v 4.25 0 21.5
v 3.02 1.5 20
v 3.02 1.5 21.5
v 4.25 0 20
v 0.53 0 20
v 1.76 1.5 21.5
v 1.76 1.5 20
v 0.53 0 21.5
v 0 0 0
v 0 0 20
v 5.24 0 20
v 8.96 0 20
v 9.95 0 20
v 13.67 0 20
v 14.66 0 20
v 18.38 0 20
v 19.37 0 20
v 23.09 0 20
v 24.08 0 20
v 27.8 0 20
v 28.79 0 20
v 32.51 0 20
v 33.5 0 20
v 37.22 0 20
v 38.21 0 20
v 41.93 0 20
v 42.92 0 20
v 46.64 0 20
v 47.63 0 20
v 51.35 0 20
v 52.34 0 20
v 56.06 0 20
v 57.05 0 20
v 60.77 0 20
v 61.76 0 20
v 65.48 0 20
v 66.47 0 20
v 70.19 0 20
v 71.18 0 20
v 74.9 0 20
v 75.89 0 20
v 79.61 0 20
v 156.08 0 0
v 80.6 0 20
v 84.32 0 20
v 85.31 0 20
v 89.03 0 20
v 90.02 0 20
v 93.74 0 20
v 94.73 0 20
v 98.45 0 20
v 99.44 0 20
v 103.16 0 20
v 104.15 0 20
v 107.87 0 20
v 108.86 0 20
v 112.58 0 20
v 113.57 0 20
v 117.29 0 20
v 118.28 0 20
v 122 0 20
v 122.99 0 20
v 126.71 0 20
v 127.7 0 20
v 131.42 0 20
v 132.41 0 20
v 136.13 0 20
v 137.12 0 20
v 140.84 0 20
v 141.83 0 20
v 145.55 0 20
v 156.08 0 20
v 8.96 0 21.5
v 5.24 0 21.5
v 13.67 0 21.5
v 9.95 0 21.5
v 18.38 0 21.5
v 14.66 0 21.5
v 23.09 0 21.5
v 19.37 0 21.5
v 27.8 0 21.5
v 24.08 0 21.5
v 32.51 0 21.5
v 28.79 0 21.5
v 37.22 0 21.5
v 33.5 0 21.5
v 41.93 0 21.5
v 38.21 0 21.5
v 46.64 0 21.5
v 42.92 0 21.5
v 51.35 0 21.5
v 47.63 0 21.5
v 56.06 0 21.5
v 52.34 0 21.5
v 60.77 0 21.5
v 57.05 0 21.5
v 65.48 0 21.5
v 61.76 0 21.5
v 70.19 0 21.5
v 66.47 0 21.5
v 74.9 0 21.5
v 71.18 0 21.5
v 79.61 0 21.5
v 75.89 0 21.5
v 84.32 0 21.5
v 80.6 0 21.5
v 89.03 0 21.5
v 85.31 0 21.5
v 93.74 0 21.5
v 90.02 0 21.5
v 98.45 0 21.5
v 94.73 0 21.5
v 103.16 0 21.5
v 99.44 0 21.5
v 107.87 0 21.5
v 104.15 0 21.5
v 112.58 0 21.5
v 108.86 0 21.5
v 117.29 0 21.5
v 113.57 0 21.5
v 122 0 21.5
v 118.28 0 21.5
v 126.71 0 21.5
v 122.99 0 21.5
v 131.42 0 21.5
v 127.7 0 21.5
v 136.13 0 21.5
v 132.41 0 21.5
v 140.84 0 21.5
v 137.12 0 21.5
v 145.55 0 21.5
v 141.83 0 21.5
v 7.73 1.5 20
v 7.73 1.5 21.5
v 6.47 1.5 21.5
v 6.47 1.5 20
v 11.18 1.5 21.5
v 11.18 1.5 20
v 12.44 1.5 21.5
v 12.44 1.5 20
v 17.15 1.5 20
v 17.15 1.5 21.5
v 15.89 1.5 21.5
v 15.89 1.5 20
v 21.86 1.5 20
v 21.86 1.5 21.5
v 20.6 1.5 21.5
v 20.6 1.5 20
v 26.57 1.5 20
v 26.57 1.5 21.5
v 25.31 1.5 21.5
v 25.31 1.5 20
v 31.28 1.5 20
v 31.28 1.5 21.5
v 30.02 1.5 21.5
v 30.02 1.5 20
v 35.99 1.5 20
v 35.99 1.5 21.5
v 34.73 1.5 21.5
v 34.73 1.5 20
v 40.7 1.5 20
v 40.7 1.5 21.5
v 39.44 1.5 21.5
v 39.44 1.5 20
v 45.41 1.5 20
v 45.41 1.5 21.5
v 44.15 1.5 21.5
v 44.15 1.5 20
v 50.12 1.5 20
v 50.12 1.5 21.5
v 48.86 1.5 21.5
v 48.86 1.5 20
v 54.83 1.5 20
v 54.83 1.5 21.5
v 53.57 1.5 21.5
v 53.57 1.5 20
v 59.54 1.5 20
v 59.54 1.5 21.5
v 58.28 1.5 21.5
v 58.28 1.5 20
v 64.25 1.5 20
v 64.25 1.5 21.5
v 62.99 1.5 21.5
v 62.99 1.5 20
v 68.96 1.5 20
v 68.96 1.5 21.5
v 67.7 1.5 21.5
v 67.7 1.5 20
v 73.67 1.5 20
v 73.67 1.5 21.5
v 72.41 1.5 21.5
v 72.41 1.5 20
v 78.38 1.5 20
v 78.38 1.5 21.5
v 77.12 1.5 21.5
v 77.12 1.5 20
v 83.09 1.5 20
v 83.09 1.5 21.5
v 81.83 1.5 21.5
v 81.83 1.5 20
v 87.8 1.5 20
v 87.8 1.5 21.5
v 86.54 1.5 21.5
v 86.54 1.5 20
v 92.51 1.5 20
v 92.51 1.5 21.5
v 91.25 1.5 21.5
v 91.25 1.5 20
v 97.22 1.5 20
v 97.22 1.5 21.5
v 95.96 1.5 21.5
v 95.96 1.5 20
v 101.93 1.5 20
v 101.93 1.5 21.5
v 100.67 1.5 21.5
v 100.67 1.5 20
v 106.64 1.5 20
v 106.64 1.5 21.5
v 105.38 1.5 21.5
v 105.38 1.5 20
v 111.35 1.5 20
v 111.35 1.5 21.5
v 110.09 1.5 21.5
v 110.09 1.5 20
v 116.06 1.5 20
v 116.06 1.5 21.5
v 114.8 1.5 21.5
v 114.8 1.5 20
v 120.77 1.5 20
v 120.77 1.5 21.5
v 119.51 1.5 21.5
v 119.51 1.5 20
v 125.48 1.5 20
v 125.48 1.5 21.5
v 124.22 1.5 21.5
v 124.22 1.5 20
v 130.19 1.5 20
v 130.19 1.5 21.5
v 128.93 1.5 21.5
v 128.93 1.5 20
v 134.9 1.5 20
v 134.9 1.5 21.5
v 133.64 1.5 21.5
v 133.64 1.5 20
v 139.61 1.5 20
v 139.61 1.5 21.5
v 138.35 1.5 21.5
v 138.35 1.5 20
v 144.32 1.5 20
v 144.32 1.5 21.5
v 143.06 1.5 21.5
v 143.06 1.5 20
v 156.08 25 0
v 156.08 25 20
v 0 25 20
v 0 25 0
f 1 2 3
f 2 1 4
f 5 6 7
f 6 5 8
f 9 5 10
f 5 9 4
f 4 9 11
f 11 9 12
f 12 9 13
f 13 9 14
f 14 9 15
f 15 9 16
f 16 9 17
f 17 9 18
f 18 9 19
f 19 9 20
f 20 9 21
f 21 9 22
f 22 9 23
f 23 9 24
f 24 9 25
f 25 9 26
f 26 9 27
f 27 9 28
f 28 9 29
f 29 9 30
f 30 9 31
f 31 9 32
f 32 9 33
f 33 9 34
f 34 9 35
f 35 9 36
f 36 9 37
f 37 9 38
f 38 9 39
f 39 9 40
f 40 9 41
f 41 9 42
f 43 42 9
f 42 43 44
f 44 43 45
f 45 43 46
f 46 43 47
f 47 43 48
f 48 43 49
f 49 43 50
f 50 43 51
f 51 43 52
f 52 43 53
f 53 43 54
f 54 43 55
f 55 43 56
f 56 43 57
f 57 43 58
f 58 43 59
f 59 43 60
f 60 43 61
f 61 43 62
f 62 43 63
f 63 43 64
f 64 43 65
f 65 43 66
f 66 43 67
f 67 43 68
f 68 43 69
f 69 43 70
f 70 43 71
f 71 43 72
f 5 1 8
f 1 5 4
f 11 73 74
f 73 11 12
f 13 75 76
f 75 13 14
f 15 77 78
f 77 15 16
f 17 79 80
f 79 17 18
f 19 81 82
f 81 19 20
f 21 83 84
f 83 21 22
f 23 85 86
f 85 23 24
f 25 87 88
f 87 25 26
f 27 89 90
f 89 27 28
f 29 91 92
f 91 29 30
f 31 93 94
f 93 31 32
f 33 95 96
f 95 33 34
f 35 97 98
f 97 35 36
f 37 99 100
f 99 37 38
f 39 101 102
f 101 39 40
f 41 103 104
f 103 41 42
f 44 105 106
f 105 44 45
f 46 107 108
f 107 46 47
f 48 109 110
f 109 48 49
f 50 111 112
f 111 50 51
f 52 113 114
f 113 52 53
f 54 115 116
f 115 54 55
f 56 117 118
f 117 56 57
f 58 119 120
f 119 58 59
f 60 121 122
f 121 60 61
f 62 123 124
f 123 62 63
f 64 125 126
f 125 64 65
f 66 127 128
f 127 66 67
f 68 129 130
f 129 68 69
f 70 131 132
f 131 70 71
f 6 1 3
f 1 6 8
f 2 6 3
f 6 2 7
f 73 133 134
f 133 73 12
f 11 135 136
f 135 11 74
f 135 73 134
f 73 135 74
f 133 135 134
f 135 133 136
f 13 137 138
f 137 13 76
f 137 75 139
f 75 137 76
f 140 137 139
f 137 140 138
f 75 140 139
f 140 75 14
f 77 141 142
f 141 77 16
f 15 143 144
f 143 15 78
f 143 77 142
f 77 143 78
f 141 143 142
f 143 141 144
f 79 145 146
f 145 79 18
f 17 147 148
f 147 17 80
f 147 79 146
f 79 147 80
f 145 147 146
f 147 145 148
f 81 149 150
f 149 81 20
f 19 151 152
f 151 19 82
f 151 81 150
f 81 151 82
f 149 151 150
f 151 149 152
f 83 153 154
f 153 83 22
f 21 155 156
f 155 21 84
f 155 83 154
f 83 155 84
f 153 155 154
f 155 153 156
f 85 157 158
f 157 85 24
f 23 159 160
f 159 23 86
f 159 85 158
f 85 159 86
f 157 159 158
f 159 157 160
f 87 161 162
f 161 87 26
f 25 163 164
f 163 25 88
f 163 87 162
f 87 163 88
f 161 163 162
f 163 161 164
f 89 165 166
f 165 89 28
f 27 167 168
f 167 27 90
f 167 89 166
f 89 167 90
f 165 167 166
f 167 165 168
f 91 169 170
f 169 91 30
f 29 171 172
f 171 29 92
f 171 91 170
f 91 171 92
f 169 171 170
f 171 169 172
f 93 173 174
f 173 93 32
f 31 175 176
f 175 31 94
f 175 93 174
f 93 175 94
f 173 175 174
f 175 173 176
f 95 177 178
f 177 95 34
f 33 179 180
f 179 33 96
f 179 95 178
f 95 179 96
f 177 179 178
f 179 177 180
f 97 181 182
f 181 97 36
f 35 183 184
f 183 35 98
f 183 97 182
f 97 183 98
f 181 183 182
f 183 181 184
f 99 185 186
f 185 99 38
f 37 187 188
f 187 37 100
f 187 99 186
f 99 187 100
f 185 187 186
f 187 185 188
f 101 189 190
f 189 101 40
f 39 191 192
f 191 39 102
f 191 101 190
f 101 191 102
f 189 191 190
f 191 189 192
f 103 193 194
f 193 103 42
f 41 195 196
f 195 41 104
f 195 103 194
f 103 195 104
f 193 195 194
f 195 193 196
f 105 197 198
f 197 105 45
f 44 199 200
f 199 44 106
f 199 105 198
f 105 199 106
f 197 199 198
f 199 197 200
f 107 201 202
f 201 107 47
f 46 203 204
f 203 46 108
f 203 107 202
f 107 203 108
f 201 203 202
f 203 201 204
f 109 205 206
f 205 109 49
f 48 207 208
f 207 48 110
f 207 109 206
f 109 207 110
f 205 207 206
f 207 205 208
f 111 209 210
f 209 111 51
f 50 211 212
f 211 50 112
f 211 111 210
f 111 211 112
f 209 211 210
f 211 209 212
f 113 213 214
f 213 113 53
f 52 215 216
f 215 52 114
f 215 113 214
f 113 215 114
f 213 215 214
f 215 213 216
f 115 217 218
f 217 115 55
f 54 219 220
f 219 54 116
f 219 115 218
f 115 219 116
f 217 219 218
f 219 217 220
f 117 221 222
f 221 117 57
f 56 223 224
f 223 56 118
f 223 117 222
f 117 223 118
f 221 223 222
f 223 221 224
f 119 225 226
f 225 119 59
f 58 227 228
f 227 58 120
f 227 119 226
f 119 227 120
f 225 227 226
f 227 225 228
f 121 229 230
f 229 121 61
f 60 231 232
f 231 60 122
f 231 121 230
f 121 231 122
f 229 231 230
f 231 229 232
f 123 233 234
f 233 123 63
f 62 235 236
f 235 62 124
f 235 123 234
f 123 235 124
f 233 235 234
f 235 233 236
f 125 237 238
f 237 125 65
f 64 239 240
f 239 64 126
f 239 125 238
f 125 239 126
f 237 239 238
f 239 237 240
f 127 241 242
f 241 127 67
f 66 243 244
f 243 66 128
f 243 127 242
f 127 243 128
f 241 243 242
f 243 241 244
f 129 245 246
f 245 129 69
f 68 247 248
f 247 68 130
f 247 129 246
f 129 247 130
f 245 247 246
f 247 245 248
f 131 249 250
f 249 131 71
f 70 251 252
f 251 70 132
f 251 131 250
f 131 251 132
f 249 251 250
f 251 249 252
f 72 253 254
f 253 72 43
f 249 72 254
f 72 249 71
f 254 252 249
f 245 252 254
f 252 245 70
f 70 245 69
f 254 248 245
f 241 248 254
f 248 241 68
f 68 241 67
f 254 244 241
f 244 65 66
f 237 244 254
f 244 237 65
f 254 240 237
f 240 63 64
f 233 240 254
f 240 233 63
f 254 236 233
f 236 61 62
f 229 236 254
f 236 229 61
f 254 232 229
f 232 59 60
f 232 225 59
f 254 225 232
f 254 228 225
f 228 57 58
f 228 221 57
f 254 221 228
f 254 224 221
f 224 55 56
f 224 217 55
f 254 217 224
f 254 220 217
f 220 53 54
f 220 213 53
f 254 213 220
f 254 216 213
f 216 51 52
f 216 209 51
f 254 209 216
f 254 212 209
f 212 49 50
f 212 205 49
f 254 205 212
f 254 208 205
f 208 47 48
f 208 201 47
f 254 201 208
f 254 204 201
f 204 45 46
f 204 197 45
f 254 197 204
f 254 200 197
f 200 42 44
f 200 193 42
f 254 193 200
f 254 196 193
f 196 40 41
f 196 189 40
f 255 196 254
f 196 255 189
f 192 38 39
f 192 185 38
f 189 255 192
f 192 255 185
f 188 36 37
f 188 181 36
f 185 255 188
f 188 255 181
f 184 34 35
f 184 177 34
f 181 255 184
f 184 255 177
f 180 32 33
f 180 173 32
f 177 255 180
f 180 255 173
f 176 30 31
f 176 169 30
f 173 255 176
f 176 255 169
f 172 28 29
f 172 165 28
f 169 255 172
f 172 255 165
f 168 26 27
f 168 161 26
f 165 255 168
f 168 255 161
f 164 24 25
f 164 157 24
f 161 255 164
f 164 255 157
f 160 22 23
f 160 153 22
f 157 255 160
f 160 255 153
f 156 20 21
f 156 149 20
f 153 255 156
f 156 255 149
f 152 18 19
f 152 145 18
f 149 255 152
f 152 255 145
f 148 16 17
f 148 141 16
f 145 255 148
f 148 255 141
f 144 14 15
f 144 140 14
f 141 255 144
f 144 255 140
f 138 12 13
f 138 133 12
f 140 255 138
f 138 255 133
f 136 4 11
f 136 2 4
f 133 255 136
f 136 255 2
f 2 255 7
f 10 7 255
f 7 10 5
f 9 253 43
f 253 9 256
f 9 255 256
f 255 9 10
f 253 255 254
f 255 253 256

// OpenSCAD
$fn = 32;

// ----------------------------------------------------------------------
// Gear rack: m=1.5 z=31, 156.08 x 25 x 21.5 mm
// ----------------------------------------------------------------------

// --- parameters (mm) ---
length = 156.08;          // rack length, X
width = 25;               // rack width, Y
height = 21.5;            // overall height, Z
module_m = 1.5;           // module
back_t = 20;              // tooth root line height
pitch = 4.71;             // circular pitch
tip_w = 1.26;             // tooth thickness at the tip
root_w = 3.72;            // tooth thickness at the root line
sink = 0.6;               // tooth root overlap into the body

tooth_span = 146.08;

module tooth(x0) {
  /* 20 deg flank profile, sunk into the body for a positive overlap */
  translate([x0, 0, back_t - sink])
    linear_extrude(height = height - back_t + sink)
      polygon(points = [[-root_w / 2, 0], [root_w / 2, 0],
                        [tip_w / 2, height - back_t],
                        [-tip_w / 2, height - back_t]]);
}

difference() {
  union() {
    cube([length, width, back_t]);
    for (i = [0 : 31 - 1])
      tooth((i + 0.5) * pitch + (tooth_span - 31 * pitch) / 2);
  }
}
